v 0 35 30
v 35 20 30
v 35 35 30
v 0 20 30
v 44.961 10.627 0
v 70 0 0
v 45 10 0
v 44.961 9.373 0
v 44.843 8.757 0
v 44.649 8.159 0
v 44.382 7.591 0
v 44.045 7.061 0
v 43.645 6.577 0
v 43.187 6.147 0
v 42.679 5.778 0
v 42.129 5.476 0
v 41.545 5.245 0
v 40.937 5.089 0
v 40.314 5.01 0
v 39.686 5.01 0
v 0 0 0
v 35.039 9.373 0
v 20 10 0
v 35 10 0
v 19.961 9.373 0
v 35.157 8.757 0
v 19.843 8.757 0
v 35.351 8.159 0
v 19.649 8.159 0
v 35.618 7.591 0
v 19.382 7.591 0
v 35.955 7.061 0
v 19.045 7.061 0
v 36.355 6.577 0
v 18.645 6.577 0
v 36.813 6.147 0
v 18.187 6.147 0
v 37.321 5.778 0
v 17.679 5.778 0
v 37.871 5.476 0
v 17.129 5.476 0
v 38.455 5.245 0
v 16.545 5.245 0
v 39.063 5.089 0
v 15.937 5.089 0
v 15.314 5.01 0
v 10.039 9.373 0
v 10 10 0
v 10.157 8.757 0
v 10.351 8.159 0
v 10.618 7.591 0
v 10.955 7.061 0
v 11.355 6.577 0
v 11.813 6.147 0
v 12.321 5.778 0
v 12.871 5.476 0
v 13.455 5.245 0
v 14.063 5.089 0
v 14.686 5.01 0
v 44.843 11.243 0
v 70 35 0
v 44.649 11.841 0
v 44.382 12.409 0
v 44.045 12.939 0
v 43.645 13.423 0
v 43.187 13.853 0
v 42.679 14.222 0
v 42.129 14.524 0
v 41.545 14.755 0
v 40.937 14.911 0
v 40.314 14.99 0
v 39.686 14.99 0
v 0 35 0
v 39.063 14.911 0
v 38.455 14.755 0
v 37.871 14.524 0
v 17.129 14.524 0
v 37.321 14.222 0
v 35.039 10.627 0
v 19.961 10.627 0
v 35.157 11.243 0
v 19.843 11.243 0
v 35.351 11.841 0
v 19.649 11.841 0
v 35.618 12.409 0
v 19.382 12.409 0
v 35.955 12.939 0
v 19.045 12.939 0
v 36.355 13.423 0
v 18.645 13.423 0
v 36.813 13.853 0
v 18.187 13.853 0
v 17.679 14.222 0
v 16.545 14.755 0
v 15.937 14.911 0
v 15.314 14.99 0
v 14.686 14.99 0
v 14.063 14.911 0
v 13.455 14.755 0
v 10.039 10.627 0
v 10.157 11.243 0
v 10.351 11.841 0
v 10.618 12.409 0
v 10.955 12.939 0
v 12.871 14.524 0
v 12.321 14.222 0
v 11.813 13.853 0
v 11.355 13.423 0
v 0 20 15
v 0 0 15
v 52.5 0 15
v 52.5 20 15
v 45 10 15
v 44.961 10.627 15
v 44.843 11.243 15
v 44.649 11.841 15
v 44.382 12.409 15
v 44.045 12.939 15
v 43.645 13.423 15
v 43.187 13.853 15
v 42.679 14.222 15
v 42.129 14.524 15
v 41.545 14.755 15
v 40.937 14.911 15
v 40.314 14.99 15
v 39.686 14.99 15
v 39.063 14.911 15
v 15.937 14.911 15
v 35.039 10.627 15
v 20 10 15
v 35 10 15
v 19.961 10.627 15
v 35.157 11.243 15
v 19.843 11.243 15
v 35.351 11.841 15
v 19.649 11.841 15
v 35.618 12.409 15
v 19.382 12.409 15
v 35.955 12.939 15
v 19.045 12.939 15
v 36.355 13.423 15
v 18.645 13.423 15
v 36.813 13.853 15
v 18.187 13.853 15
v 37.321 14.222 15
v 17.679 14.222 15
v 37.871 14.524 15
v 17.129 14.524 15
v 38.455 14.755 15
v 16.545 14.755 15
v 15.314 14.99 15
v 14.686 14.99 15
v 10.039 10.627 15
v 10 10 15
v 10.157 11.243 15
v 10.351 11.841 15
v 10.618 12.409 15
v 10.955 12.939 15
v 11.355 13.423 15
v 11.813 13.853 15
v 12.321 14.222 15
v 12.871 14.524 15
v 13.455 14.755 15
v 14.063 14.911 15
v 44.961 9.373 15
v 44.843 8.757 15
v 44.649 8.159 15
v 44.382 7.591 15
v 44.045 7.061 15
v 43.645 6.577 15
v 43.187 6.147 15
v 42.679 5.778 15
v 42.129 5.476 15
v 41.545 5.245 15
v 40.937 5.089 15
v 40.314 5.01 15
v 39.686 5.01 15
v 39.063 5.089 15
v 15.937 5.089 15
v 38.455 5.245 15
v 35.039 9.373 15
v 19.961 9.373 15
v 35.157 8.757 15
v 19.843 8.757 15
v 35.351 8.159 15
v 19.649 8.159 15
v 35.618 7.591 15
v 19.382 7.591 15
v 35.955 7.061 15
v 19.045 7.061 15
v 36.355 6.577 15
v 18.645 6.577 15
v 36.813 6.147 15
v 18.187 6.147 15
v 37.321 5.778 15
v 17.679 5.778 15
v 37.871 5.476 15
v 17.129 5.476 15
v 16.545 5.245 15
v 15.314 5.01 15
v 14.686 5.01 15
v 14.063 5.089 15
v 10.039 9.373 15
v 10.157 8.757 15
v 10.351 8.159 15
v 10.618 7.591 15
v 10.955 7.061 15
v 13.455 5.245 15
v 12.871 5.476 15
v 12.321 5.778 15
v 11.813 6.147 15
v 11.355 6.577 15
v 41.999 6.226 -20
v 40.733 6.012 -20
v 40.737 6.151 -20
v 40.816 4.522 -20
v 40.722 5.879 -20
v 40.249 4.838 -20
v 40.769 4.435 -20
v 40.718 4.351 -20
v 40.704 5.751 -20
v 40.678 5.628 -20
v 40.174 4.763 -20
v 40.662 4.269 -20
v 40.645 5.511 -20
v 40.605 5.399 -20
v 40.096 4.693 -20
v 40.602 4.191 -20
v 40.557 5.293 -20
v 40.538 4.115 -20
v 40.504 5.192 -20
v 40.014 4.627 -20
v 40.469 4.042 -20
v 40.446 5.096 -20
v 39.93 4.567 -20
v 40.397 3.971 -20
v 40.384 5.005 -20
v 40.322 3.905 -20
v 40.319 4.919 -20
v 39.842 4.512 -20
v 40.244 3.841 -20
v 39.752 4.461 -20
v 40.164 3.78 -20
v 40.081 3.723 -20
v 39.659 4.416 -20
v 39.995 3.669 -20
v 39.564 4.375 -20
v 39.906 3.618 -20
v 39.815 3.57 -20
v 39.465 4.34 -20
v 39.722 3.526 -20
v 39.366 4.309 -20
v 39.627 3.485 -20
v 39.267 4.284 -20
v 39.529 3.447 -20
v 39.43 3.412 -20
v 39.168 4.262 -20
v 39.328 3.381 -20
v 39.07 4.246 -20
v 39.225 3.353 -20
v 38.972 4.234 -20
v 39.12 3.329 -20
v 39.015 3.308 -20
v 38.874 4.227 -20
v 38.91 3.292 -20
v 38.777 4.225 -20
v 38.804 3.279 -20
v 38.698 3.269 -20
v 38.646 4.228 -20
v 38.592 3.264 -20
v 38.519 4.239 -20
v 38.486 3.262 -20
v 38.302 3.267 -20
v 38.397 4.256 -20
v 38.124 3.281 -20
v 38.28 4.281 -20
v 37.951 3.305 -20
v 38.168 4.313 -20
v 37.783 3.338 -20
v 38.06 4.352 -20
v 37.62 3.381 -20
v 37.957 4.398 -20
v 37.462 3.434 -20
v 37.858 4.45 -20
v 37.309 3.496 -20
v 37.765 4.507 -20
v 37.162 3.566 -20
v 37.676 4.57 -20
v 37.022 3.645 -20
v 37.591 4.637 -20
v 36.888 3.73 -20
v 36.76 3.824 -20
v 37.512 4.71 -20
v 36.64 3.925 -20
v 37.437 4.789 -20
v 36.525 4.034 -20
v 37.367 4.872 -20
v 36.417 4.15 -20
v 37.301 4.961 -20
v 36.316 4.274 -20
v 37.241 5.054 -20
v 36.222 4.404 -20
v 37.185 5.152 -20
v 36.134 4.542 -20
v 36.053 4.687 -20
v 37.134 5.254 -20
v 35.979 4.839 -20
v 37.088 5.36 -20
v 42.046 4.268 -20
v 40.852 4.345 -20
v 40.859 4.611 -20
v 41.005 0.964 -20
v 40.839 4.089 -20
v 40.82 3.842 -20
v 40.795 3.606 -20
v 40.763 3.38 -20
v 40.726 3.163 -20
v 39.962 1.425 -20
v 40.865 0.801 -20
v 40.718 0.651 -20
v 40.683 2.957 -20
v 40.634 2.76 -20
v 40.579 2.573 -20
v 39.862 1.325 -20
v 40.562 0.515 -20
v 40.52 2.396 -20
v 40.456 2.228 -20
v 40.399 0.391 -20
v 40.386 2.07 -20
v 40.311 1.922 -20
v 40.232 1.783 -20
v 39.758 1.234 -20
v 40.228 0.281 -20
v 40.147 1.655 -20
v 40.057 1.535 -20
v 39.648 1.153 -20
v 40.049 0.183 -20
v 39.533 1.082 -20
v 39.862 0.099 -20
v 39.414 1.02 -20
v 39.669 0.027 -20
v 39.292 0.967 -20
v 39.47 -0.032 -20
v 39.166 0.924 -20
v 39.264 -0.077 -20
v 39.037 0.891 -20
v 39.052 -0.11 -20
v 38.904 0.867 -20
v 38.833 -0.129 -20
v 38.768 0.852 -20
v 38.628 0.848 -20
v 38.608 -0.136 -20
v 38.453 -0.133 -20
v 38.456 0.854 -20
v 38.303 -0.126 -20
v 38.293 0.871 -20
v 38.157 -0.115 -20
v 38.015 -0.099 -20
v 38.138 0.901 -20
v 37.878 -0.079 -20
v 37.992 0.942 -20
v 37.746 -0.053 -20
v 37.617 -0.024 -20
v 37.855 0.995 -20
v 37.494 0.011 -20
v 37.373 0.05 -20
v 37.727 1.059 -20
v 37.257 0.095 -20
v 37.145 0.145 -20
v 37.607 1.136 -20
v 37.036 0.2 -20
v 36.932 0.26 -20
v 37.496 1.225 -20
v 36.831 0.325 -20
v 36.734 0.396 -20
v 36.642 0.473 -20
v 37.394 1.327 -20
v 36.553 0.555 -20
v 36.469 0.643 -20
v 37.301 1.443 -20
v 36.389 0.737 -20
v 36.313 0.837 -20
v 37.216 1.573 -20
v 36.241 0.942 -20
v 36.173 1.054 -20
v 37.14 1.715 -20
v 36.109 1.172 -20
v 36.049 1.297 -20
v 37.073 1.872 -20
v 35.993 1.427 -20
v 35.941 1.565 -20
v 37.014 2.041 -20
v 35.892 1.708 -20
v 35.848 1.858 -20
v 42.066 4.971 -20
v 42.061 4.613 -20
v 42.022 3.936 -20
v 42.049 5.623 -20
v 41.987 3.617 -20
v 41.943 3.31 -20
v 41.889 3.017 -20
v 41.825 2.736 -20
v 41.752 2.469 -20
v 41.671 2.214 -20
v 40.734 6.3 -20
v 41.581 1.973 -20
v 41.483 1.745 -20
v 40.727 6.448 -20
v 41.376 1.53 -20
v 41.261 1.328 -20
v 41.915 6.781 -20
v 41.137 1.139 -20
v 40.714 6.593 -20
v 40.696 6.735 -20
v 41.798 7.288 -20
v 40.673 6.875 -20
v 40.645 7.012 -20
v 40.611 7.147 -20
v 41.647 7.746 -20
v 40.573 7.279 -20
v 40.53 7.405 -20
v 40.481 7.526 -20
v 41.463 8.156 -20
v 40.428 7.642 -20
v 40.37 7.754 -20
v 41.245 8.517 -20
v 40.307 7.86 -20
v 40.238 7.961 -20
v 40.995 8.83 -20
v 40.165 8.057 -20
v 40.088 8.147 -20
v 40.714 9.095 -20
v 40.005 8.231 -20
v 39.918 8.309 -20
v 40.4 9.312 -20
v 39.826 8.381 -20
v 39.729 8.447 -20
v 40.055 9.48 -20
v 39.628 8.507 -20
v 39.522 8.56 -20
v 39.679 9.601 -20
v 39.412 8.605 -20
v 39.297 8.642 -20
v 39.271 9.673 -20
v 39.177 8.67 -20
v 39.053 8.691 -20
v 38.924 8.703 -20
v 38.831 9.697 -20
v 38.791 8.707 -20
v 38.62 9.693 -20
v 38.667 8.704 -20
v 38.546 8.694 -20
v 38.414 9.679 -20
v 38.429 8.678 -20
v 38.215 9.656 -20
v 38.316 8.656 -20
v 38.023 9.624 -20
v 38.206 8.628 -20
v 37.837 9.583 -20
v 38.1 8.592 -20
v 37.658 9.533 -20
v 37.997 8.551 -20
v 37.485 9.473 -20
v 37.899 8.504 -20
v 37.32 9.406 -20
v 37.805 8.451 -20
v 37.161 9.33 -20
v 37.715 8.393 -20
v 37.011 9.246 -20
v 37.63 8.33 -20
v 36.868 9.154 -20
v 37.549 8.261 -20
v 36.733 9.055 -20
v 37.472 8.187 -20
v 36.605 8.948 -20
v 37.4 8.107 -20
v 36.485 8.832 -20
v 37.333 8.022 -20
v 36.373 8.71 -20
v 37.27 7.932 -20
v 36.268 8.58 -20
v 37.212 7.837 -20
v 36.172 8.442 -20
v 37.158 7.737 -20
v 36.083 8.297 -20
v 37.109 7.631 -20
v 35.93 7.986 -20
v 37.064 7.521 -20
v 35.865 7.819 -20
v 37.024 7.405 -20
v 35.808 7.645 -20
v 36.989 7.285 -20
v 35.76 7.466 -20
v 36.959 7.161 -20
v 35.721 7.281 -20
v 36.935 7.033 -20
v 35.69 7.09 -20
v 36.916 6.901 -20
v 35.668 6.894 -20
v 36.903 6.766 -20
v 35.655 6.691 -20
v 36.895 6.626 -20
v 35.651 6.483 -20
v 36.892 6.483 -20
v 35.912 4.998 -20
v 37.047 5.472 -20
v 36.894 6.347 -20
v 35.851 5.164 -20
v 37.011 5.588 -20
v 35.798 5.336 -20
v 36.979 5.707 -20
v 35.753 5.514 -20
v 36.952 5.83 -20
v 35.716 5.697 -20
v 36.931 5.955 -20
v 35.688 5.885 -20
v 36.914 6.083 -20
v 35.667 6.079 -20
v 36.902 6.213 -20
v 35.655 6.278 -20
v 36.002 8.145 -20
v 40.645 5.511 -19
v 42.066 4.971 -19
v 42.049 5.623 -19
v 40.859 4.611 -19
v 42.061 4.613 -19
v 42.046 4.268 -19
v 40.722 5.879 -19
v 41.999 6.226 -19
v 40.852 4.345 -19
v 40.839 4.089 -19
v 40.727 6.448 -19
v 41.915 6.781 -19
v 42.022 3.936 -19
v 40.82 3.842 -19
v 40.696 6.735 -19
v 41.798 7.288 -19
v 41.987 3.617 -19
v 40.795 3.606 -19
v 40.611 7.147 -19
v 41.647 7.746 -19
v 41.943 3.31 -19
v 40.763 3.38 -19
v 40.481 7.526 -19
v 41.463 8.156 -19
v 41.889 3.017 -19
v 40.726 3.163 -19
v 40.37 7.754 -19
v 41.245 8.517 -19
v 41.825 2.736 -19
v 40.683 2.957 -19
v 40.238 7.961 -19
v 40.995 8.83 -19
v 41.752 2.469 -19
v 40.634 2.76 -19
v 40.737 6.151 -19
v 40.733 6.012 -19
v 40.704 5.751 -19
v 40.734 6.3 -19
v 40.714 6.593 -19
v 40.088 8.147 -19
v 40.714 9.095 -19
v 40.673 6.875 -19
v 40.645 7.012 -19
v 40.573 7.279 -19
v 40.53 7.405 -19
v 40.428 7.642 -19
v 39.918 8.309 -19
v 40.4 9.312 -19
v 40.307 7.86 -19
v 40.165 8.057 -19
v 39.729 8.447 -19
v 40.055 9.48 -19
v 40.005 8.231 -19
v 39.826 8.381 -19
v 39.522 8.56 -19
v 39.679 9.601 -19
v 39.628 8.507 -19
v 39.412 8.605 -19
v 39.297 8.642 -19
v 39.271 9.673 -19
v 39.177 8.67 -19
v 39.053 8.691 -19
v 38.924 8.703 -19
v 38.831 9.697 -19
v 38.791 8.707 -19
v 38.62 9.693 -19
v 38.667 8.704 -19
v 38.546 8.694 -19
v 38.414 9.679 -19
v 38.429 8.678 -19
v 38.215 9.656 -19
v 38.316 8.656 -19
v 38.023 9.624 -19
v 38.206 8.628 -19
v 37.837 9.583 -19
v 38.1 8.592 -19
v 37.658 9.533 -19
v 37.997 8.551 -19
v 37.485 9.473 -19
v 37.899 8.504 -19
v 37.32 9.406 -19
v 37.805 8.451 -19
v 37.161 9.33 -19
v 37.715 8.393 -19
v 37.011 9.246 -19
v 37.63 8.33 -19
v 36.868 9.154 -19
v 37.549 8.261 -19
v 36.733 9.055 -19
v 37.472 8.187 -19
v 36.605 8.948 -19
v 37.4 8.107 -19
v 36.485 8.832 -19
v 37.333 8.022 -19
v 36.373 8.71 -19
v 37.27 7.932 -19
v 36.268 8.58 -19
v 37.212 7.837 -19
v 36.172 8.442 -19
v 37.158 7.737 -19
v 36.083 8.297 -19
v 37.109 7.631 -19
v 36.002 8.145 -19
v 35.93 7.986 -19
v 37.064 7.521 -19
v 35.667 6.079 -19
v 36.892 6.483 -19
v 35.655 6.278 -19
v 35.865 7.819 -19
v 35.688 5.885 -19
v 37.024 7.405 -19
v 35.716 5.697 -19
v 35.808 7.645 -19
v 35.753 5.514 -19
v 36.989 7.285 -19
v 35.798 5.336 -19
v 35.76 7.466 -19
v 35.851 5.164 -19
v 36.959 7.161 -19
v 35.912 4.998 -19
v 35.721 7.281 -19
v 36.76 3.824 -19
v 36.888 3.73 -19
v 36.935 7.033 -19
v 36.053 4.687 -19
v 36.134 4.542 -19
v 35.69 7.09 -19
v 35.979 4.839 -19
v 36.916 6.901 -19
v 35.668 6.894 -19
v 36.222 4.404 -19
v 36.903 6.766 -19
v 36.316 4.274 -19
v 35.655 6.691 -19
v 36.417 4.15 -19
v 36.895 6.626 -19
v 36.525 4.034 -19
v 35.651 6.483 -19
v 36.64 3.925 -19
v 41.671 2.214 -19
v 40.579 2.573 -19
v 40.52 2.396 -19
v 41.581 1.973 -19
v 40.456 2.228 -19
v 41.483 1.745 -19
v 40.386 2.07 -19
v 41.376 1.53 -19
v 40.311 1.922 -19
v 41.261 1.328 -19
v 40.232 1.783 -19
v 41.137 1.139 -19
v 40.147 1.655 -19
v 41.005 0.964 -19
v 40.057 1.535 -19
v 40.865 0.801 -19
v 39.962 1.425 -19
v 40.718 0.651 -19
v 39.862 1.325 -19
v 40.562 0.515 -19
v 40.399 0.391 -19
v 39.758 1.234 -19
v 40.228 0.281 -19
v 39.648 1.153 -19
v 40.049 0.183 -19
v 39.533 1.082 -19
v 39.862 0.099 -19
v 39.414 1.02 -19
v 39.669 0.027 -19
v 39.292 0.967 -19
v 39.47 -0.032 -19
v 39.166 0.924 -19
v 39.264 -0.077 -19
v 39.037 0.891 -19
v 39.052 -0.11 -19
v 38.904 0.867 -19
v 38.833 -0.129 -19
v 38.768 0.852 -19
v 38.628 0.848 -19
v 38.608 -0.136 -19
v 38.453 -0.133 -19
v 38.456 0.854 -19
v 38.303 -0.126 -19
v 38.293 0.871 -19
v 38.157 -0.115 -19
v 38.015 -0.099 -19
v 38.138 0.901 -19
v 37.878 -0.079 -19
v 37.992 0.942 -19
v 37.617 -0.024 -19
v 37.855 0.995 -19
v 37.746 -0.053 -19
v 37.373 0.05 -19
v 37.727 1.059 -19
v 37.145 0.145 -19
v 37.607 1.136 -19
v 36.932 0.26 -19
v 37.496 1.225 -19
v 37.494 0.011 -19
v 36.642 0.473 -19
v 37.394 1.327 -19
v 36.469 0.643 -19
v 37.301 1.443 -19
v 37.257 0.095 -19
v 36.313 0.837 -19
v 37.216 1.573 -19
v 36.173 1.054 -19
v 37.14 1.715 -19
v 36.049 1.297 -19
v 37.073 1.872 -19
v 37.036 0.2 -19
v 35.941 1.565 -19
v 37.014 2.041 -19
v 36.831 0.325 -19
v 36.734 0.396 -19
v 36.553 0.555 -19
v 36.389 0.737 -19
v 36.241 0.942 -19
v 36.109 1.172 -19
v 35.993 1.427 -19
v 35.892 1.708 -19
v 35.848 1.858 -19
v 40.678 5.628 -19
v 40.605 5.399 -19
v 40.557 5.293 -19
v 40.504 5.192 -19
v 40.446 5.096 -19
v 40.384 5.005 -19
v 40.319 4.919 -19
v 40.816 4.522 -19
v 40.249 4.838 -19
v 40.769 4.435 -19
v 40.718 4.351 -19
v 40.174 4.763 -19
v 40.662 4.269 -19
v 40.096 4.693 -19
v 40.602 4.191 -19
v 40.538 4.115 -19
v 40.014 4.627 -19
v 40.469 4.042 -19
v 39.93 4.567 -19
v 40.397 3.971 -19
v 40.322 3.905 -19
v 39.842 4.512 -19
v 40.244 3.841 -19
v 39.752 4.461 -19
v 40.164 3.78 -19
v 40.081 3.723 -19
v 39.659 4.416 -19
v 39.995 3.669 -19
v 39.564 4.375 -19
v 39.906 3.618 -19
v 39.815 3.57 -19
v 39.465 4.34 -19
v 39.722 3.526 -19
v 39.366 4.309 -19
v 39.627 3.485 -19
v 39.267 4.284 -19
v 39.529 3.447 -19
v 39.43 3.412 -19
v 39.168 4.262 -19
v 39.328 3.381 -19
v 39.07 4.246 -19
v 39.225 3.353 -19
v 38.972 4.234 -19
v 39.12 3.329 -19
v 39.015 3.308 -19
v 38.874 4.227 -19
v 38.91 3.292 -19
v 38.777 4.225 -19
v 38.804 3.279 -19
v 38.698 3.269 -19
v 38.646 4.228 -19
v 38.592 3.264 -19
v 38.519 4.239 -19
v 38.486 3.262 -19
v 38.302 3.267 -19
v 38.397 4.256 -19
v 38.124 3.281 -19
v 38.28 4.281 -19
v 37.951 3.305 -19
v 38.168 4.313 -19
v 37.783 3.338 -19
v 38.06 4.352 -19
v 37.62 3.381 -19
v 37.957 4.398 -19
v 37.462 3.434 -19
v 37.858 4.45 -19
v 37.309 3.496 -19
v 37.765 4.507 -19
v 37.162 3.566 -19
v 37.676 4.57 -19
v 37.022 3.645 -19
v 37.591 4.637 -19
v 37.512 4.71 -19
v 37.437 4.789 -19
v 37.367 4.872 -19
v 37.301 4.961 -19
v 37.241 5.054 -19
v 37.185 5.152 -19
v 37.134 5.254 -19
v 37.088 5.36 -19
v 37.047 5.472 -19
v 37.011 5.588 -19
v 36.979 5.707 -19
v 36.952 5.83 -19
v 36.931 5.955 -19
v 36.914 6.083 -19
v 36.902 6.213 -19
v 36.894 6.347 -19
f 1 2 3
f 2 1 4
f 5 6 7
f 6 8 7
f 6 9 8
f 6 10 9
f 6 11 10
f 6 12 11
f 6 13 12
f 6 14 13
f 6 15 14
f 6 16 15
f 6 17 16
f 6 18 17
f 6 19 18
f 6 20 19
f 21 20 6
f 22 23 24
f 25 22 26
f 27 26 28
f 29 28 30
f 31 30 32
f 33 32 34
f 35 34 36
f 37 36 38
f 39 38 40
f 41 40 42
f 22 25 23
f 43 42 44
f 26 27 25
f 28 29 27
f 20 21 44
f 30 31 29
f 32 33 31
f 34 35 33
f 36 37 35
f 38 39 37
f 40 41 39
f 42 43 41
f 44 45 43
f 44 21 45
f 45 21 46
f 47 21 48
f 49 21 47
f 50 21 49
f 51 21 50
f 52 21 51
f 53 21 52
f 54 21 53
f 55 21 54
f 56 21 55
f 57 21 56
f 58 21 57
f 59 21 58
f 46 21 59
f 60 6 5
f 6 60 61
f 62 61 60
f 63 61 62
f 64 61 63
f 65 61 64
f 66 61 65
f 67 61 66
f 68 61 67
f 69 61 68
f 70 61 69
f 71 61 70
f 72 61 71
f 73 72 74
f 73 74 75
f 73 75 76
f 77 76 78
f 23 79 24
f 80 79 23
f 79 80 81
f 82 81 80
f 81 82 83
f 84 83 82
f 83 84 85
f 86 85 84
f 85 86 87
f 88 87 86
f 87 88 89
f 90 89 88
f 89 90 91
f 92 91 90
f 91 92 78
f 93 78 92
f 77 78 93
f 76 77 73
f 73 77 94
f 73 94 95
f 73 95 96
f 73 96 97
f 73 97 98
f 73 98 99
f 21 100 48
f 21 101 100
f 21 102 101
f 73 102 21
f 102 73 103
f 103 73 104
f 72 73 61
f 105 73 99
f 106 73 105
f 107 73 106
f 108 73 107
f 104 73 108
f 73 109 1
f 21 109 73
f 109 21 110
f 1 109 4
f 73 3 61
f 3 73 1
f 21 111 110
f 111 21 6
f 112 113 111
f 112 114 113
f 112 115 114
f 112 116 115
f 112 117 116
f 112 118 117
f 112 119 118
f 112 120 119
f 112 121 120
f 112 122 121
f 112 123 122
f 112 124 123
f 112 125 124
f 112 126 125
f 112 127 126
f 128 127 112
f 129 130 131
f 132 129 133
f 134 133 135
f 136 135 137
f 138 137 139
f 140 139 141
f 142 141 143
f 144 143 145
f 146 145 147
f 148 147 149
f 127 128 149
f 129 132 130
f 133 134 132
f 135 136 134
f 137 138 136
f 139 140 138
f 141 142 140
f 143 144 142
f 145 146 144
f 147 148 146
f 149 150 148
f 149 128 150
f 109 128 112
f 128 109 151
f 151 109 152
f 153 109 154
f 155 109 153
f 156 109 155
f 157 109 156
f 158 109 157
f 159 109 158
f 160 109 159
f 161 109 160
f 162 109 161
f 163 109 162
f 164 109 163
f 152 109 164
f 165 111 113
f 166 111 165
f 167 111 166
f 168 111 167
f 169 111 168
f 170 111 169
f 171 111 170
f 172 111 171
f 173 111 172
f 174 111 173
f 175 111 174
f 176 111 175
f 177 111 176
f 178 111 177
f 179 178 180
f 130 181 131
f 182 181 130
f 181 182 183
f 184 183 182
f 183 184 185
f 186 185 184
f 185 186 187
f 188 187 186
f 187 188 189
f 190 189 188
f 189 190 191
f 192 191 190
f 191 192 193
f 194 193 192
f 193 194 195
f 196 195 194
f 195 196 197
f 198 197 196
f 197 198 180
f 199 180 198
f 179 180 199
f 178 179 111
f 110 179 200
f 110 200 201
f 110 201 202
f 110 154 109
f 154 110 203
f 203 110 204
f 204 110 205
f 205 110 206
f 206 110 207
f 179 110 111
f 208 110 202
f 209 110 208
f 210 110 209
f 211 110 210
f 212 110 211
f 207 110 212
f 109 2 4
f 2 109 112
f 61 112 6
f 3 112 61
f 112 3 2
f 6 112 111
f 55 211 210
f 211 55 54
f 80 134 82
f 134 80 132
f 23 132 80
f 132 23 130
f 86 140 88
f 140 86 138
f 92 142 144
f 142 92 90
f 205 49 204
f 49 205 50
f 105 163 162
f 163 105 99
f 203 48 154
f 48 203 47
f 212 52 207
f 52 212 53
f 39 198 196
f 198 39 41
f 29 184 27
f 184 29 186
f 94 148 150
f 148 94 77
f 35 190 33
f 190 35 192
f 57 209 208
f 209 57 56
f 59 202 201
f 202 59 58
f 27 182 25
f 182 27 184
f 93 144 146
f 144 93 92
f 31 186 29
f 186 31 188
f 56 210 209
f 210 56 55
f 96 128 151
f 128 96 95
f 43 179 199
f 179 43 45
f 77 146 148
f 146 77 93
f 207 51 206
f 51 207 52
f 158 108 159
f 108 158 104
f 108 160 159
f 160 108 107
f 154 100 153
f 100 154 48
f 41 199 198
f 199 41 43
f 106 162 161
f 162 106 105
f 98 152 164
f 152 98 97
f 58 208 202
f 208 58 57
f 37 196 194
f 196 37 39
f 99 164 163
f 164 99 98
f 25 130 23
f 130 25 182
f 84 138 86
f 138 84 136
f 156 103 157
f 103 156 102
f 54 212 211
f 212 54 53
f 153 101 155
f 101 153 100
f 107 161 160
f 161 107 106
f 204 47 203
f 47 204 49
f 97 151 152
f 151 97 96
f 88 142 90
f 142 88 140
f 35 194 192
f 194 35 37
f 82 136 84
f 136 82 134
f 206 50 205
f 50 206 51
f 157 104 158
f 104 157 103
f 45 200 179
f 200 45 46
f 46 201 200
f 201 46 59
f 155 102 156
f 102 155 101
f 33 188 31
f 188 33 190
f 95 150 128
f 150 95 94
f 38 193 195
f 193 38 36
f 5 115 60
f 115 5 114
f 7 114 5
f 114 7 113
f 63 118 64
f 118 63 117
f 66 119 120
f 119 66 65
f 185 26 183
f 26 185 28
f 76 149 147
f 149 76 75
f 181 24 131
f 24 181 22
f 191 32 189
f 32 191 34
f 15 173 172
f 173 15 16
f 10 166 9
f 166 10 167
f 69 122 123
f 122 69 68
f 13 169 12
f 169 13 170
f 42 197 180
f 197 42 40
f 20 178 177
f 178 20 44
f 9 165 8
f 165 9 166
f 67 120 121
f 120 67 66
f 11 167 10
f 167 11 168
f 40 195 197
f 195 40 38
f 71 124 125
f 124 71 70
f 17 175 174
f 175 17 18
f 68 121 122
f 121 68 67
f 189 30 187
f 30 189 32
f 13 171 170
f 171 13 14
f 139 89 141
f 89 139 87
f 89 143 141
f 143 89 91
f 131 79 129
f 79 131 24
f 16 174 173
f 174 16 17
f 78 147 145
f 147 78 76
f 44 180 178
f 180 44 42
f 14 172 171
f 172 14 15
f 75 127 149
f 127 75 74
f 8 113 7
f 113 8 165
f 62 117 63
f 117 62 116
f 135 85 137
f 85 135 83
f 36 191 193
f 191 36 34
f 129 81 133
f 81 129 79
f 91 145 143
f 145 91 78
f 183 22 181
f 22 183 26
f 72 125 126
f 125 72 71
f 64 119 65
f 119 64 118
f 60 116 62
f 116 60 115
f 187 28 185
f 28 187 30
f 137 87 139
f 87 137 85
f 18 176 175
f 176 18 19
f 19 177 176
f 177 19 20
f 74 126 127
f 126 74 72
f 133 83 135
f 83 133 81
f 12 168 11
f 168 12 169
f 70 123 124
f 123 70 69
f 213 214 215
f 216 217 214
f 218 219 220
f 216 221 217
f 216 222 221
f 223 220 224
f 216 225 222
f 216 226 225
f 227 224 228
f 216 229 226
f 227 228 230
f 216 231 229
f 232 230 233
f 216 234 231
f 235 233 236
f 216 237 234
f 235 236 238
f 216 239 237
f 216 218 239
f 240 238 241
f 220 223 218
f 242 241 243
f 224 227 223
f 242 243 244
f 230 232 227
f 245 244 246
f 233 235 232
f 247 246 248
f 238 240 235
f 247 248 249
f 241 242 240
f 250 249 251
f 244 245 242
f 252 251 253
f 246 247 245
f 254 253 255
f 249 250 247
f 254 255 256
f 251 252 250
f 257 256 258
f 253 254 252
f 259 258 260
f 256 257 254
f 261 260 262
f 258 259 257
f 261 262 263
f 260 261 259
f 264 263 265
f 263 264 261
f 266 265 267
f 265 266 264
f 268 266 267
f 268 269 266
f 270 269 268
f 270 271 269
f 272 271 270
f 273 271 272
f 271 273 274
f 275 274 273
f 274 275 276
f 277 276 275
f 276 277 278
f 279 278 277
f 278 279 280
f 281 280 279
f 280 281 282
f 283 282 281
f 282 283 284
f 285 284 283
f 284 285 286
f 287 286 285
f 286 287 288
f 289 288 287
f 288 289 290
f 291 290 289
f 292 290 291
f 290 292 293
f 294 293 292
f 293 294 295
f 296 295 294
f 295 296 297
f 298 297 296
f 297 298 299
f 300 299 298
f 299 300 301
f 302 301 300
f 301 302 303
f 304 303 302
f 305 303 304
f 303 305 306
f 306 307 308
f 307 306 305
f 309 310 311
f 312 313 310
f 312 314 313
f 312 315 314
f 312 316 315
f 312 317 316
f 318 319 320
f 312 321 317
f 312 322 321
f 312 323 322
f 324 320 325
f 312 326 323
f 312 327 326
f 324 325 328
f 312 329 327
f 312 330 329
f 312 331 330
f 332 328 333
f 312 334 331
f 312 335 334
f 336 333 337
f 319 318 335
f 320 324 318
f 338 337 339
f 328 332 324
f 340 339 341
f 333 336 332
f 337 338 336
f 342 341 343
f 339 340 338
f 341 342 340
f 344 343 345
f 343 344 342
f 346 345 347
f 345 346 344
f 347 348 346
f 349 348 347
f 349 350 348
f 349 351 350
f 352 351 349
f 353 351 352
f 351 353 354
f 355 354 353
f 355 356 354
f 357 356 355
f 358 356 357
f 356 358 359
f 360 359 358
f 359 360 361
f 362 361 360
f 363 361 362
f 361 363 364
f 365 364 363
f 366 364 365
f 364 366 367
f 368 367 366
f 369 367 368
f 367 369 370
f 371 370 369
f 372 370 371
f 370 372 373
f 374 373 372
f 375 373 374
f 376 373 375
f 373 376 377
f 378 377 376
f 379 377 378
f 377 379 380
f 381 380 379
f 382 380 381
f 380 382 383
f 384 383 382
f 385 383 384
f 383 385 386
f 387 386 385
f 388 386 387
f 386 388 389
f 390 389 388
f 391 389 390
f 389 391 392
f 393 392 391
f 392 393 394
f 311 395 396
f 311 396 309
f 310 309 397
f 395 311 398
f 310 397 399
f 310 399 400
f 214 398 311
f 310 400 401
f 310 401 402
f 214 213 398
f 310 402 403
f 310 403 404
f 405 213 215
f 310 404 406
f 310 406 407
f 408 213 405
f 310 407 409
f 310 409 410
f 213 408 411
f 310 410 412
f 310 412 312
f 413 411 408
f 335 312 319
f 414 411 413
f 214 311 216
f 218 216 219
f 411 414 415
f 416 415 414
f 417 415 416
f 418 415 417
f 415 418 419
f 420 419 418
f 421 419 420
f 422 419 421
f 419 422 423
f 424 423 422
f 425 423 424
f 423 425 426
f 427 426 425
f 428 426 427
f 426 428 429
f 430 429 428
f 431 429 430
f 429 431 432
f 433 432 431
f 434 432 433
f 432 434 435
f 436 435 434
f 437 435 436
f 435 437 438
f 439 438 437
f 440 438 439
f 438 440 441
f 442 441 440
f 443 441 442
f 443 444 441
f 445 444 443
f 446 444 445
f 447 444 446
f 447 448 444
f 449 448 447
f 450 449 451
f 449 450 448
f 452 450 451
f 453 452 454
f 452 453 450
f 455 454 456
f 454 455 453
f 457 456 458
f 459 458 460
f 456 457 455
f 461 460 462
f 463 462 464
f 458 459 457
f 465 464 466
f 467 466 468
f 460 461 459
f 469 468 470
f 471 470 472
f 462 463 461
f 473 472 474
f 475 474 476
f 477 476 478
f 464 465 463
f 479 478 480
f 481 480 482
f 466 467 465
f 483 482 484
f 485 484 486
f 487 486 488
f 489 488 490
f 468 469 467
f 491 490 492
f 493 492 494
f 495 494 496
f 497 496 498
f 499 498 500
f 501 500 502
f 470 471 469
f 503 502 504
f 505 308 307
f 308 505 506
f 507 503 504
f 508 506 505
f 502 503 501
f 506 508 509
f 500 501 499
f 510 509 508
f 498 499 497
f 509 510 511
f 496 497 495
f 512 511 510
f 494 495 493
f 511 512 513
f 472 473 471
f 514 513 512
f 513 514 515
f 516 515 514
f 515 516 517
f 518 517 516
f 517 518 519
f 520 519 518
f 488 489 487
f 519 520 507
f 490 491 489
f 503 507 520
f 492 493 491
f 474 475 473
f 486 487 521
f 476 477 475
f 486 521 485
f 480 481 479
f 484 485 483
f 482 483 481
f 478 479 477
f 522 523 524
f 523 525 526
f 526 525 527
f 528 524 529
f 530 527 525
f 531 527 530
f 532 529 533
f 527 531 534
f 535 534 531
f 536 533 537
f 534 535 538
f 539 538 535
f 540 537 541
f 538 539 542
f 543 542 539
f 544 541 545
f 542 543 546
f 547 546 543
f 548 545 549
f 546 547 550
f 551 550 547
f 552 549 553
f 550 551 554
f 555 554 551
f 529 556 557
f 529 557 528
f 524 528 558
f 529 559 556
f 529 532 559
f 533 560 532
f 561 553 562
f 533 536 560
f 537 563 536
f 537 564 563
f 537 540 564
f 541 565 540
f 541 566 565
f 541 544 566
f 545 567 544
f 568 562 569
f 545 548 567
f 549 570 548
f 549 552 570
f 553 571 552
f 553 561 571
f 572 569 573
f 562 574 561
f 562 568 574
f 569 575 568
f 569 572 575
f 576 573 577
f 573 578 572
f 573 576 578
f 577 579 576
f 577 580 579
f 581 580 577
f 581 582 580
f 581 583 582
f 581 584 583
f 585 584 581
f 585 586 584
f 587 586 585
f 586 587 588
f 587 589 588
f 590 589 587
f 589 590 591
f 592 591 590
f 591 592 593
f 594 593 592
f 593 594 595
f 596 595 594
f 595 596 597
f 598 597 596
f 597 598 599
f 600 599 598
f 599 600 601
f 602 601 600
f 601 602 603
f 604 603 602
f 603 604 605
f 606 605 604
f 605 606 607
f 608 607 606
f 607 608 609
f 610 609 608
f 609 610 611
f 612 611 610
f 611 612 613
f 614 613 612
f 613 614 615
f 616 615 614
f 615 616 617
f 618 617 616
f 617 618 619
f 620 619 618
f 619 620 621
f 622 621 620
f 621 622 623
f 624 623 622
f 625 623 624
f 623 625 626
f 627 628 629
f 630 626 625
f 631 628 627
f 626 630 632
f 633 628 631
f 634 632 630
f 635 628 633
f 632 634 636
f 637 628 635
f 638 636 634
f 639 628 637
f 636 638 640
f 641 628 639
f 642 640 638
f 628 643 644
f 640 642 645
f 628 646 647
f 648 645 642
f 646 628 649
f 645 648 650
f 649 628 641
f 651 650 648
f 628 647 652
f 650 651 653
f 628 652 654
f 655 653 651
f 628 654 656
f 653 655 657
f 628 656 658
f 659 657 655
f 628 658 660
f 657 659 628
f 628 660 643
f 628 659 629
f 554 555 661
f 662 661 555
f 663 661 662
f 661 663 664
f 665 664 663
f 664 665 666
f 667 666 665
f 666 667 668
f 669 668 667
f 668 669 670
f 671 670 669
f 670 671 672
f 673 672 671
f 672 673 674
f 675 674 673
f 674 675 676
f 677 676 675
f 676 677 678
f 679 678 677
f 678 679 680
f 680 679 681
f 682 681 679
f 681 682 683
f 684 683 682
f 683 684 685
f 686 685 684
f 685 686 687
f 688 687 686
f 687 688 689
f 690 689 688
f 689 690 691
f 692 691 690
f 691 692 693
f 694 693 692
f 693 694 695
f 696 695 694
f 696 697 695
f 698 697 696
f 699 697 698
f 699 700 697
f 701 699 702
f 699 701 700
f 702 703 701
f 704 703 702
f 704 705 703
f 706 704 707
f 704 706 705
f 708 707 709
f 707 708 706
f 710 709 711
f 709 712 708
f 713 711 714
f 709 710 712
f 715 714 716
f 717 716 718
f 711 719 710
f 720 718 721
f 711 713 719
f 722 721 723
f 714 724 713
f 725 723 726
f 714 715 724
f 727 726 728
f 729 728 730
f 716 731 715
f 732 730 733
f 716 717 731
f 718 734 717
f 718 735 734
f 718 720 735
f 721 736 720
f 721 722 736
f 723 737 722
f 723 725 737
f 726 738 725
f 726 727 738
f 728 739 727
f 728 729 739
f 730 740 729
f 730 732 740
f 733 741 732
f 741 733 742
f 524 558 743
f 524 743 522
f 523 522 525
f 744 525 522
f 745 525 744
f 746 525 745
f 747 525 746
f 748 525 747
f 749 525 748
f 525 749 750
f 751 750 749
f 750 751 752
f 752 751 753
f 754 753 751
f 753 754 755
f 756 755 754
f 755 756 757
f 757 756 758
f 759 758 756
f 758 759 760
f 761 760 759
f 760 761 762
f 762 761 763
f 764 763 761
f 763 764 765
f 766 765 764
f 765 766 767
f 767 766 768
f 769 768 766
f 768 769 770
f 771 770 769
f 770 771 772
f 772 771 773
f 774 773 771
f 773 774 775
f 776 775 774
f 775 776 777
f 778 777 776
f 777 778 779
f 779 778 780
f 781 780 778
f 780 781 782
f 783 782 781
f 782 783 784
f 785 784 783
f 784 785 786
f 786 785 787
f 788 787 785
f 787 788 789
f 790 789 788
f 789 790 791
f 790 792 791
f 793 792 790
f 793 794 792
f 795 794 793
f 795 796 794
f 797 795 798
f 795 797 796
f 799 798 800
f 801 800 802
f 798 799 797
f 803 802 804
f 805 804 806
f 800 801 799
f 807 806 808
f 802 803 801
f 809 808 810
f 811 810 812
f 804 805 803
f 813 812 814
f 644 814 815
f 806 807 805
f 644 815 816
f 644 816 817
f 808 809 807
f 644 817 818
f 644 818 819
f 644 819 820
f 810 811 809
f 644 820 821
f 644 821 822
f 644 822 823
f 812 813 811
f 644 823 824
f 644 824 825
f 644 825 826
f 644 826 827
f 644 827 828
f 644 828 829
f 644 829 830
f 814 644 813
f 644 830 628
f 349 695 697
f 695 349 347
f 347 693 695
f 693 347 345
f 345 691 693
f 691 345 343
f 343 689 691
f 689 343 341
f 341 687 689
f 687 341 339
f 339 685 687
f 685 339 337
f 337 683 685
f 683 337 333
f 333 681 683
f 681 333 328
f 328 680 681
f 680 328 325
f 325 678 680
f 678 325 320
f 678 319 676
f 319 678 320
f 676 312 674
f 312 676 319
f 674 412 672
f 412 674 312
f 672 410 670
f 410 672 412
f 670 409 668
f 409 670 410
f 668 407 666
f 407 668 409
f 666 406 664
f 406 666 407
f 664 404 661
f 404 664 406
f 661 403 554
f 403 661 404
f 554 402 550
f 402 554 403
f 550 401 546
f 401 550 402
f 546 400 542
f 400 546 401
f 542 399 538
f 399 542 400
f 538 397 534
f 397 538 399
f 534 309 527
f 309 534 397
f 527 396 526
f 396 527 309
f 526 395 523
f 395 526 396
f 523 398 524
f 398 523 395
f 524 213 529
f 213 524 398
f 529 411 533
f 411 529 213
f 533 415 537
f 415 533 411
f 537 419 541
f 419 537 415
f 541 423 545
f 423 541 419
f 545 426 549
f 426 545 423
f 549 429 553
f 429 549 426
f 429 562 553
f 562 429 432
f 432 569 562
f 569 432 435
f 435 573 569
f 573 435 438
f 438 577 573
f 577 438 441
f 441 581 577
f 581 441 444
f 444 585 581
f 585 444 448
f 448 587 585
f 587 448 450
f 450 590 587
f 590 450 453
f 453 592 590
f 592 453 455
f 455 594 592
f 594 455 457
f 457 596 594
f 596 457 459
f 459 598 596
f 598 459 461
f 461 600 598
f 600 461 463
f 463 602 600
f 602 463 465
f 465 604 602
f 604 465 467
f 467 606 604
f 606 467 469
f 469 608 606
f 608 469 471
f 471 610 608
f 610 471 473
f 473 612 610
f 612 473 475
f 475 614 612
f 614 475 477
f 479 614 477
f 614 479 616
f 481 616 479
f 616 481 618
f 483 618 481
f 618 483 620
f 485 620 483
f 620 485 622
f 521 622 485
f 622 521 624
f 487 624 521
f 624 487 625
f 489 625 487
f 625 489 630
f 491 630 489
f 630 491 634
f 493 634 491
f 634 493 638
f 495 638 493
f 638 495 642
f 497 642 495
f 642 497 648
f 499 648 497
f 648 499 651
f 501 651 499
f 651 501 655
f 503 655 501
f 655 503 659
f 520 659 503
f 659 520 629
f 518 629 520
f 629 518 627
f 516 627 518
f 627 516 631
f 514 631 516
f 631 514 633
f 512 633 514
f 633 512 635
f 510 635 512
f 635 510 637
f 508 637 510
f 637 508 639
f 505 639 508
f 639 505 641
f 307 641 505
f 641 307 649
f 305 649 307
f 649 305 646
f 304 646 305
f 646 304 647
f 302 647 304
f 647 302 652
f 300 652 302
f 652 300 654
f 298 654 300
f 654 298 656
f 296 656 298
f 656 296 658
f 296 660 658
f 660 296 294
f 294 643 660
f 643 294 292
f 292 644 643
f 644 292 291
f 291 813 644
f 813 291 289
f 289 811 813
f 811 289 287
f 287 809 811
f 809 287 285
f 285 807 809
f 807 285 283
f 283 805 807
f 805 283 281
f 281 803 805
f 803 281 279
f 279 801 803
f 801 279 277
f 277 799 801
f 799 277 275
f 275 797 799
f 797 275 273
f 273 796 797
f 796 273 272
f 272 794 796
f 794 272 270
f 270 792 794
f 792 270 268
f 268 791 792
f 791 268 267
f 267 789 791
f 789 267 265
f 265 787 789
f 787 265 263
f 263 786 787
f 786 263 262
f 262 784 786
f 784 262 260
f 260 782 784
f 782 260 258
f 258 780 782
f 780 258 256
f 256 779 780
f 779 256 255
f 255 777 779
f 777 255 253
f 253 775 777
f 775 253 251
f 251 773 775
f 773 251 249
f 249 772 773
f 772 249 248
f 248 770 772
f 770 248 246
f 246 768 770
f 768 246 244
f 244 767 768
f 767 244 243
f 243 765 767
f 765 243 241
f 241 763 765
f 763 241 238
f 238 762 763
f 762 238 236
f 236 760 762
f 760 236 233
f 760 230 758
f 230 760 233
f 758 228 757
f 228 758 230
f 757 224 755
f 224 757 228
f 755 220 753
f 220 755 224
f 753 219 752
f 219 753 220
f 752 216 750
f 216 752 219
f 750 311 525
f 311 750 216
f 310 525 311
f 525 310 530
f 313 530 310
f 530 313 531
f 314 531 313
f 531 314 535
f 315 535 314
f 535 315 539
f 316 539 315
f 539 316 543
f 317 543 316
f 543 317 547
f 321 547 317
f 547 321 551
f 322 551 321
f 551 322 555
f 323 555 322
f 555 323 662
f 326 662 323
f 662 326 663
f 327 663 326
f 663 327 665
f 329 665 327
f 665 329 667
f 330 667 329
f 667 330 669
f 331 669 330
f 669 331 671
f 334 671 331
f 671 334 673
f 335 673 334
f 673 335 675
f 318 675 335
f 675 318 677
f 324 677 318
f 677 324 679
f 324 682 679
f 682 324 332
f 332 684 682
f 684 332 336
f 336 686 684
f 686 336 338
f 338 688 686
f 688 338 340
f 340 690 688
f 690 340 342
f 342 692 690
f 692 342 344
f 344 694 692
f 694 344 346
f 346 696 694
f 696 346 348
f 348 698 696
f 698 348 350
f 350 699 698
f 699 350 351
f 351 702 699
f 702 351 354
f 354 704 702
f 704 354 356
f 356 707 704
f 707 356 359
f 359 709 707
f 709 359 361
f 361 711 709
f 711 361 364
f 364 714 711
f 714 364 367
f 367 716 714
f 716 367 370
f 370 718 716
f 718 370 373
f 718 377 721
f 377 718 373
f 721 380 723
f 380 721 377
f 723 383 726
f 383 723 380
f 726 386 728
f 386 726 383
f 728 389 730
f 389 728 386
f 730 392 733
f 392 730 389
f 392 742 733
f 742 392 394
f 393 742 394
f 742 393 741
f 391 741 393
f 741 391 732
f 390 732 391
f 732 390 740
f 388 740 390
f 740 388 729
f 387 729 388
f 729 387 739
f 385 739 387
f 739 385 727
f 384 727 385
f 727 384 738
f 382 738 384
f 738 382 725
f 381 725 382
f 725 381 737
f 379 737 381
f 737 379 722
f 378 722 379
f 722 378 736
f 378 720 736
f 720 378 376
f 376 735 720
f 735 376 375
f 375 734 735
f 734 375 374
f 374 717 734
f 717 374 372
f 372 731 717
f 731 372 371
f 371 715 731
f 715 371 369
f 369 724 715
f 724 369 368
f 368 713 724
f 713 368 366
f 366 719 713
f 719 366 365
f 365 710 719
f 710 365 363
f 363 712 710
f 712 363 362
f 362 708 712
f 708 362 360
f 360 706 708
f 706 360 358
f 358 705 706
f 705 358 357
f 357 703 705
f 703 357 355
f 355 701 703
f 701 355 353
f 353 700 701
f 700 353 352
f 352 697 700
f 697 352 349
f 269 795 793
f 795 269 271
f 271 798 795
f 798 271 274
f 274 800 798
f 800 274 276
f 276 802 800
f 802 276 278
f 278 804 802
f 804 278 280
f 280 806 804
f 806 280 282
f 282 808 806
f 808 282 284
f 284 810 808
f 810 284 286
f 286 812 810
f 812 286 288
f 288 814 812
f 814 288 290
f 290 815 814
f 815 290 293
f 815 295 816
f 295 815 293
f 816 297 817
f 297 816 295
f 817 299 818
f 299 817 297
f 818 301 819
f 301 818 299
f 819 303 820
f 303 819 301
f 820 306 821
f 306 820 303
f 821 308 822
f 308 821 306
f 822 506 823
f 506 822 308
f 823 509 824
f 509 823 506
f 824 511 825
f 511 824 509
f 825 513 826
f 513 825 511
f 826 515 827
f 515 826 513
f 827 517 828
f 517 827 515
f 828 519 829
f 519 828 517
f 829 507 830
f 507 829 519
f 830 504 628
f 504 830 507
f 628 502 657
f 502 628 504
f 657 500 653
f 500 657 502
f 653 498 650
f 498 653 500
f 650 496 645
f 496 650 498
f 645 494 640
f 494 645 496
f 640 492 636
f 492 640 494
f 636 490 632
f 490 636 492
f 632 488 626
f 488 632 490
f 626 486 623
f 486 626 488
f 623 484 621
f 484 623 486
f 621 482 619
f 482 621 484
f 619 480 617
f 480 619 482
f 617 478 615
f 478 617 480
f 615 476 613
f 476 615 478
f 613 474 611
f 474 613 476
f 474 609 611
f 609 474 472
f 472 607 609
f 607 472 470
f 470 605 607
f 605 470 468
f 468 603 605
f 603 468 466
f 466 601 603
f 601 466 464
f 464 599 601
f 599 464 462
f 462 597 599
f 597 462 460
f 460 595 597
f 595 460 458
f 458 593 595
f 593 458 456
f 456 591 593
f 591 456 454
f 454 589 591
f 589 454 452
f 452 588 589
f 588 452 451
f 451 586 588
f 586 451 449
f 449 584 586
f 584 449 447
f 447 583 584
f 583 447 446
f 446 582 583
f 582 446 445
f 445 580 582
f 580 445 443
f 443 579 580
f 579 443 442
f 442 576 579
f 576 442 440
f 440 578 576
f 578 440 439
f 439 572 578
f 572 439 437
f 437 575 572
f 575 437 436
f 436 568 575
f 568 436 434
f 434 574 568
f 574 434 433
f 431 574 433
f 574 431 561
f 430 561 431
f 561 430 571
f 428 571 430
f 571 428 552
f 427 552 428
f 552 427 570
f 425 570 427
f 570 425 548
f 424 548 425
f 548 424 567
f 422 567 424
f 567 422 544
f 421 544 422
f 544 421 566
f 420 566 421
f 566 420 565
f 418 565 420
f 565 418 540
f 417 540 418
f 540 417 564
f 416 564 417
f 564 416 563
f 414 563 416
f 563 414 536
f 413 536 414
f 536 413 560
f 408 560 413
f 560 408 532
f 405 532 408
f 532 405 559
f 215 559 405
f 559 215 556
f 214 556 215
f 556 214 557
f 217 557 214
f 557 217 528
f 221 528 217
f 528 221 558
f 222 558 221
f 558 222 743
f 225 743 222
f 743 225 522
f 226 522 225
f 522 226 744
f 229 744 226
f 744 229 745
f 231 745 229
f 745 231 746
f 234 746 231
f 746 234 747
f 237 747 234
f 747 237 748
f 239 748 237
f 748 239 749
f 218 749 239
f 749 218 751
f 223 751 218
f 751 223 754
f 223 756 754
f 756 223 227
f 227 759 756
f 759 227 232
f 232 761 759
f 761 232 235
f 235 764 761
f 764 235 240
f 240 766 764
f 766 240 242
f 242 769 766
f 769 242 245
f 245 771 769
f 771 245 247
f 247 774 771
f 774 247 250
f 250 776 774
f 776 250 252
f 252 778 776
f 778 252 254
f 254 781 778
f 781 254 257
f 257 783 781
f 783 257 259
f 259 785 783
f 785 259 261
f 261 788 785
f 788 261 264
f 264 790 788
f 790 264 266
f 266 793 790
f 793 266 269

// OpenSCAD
$fn=50;

cw=70;
cd=35;
ch=30;
cy=10;

difference() {
    cube([cw,cd,ch]);
    translate([0,0,15])
    cube([cw,20,15]);
    translate([0,cd,0])
    rotate([90,0,0])
    linear_extrude(height=cd)
    polygon([[ 70,0  ],[ 35,ch ],[ cw,ch  ]]);
    translate([15,10,0])
    cylinder(h=15,d=cy);
    translate([40,10,0])
    cylinder(h=15,d=cy);
}
translate([cw/2,0,-20])
linear_extrude(height=1)
text("9");
